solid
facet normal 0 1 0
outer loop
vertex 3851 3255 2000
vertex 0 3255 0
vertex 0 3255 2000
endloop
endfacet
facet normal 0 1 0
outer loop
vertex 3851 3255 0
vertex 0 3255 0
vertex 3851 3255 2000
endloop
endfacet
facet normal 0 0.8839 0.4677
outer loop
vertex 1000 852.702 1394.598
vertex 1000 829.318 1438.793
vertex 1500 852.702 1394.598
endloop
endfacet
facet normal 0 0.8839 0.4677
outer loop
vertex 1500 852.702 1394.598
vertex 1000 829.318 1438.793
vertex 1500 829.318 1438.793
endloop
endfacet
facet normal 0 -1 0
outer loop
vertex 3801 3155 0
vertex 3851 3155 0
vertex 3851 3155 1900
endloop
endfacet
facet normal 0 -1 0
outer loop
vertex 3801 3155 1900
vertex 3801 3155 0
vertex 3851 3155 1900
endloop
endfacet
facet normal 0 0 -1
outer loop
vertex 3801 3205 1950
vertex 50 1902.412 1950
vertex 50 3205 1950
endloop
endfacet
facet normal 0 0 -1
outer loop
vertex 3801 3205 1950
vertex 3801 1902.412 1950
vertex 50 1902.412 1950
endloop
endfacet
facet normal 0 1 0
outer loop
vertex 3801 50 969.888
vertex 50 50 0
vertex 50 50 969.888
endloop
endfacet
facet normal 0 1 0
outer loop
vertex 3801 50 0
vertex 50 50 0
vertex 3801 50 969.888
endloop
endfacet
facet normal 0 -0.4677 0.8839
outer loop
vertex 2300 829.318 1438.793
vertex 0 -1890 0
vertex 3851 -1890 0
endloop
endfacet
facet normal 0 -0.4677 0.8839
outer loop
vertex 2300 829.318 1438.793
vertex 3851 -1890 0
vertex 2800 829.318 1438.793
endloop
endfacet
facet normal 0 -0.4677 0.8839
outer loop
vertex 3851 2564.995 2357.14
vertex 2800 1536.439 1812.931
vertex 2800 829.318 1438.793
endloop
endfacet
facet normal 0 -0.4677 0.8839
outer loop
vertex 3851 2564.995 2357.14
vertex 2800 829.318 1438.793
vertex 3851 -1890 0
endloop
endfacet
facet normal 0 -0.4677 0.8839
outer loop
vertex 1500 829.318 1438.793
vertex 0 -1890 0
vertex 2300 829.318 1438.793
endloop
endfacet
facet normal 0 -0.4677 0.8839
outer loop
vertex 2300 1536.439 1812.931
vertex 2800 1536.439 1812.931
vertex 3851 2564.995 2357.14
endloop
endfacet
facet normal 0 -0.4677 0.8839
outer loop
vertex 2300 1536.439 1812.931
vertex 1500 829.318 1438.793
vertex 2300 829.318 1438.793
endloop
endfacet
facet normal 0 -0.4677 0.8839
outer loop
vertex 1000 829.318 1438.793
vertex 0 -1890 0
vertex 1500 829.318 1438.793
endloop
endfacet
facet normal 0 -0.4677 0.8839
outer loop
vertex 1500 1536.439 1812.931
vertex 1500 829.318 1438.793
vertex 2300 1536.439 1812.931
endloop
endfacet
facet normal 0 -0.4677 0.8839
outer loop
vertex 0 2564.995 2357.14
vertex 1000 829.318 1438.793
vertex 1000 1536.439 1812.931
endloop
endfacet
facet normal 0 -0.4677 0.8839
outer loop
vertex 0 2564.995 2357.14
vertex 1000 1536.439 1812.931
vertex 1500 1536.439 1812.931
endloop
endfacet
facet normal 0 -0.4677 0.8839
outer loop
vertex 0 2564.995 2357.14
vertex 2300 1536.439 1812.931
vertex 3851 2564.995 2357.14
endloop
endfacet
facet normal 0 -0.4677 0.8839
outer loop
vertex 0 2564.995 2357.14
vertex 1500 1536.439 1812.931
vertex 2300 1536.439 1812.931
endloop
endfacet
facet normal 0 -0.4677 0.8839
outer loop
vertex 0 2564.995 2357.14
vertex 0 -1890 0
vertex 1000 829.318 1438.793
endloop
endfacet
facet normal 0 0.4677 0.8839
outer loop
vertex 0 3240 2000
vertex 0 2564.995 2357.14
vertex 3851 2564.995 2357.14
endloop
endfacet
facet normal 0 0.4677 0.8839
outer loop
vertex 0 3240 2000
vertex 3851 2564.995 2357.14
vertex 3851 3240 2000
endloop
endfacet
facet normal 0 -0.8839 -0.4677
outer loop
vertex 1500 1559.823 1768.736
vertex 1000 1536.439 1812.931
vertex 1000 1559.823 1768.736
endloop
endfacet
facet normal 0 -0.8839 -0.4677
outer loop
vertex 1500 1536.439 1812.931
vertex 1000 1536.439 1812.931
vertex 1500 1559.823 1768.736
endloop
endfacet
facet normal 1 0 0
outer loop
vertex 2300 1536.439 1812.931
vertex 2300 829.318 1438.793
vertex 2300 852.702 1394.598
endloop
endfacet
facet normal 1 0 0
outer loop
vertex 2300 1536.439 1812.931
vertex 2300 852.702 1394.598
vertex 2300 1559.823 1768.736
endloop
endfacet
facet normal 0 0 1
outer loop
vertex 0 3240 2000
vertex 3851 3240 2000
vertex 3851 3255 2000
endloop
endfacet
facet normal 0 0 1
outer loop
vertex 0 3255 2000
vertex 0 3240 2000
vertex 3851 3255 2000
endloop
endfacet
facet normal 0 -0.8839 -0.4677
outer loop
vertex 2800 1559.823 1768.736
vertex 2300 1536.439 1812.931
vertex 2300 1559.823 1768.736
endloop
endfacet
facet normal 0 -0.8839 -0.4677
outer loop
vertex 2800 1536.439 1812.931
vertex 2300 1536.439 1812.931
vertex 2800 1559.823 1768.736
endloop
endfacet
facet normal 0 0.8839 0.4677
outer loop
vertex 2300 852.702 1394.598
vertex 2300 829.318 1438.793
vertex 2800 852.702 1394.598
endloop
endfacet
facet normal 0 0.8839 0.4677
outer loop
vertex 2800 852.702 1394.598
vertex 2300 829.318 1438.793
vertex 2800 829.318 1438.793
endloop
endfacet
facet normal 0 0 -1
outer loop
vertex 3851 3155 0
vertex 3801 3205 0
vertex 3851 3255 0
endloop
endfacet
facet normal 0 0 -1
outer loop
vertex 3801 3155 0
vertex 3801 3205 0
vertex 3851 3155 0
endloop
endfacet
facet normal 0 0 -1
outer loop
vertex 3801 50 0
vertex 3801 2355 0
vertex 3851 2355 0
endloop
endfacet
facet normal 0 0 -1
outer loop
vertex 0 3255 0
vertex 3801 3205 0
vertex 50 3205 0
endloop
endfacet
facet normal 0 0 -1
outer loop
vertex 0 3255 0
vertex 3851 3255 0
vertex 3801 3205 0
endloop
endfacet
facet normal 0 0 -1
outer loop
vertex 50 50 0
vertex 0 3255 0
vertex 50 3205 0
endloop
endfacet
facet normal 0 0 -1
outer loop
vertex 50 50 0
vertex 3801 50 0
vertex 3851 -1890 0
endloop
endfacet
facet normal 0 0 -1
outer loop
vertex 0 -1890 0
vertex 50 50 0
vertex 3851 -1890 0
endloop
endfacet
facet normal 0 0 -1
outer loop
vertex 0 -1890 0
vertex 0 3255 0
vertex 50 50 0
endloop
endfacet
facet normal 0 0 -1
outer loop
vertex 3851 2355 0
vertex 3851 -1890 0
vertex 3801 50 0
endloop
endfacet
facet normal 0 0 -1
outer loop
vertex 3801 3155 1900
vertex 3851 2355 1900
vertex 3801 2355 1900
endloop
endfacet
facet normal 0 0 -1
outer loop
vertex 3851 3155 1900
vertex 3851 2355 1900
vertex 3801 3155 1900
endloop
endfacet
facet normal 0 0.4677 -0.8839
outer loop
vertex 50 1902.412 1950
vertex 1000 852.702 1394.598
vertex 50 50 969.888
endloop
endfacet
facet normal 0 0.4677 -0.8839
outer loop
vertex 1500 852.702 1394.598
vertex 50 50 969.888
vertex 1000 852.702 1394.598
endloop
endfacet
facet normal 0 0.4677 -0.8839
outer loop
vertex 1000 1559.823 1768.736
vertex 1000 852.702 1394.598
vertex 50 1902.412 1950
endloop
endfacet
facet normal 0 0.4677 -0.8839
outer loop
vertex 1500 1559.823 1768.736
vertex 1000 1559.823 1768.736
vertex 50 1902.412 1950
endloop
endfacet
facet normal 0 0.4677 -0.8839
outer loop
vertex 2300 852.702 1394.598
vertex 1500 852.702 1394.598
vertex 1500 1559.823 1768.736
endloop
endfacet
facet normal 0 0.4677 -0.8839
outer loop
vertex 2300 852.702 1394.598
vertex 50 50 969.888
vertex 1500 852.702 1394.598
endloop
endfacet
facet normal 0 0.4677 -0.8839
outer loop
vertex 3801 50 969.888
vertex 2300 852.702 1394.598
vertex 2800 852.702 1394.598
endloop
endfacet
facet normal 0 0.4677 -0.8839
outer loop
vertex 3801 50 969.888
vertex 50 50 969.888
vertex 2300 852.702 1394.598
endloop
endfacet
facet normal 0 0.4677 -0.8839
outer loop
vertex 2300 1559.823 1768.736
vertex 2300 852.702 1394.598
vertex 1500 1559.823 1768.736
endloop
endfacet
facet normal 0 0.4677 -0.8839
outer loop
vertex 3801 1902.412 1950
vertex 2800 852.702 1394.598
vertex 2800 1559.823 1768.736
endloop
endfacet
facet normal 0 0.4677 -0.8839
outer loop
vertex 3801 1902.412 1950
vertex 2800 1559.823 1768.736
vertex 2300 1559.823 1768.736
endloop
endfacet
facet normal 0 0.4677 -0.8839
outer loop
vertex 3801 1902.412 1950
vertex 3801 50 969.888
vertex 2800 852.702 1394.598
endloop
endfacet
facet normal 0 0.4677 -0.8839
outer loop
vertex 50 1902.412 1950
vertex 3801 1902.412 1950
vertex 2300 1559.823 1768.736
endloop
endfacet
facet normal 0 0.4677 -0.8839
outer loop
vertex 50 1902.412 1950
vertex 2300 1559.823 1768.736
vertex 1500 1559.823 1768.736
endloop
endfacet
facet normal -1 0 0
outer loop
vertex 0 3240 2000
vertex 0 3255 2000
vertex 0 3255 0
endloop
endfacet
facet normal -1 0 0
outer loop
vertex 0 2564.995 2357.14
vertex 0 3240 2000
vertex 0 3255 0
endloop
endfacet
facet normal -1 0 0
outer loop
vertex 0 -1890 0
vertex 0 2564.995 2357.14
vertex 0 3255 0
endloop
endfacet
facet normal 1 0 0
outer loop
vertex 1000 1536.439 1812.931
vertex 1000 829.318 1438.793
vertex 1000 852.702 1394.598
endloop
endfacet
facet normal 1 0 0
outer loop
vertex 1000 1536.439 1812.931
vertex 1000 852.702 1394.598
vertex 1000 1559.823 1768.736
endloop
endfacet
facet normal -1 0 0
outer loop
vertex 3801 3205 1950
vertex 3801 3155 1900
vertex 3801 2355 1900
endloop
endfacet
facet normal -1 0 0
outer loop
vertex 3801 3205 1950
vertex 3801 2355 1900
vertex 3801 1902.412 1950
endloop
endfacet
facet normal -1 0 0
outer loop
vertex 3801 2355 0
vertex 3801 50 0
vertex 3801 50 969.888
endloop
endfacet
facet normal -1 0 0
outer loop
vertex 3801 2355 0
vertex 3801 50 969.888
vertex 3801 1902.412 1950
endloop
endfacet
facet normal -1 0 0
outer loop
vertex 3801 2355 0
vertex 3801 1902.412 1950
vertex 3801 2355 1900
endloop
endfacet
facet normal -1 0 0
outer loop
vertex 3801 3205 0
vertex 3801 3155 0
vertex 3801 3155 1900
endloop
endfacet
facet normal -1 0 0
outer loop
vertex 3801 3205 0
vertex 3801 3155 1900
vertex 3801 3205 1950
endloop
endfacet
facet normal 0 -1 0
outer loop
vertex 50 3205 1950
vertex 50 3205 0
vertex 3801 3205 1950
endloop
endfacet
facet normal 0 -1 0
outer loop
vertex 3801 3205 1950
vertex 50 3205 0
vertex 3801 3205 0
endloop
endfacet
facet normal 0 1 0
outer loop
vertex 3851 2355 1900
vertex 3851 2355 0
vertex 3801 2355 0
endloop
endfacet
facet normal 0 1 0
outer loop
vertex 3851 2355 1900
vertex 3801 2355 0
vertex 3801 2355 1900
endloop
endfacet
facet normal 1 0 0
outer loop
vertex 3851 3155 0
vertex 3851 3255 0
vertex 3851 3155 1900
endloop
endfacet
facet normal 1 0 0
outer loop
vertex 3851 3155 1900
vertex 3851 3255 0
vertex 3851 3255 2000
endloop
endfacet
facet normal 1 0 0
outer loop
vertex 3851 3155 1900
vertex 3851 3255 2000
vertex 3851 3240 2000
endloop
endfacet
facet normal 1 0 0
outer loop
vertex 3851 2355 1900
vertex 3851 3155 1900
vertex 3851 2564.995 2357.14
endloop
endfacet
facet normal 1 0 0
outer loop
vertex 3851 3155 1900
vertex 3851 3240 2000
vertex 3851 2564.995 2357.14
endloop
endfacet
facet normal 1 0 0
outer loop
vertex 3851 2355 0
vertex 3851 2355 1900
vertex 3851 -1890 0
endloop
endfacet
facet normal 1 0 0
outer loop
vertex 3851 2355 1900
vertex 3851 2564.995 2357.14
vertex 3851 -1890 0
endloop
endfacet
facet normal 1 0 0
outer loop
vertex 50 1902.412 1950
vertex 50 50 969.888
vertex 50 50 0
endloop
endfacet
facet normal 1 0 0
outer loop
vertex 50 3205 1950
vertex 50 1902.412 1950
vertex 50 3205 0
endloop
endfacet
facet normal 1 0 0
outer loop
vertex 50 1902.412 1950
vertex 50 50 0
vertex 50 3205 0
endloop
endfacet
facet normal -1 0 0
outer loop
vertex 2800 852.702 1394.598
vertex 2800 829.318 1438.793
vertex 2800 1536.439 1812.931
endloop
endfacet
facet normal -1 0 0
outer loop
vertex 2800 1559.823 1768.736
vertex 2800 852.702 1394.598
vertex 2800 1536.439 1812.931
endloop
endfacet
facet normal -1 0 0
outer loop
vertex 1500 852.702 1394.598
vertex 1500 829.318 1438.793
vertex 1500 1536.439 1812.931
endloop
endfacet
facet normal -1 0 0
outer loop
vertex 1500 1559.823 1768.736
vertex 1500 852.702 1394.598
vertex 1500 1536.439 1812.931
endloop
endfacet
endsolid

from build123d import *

# Parameters (mm, degrees)
F0_W      = 3851
F0_H      = 3255
F1_DEPTH  = 2500
F3_DEPTH  = 3851
F4_T      = -50
F5_W      = 800
F5_H      = 1900
F6_DEPTH  = 50
F7_W      = 500
F7_H      = 800
F8_DEPTH  = 50
F10_DEPTH = 3851


with BuildPart() as f1:
    # F0 (on Top) → F1 (new body)
    with BuildSketch(Plane.XY):
        with Locations((1925.5, 1627.5)):
            Rectangle(F0_W, F0_H)
    extrude(amount=F1_DEPTH)

    # F2 (on face) → F3 (cut, through all)
    with BuildSketch(Plane.YZ.offset(3851)):
        Polygon((0, 2500), (0, 1000), (1890, 2000), (3255, 2000), (3255, 2500), align=None)
    extrude(amount=-F3_DEPTH, mode=Mode.SUBTRACT)

    # F4
    f4_openings = [f1.faces().sort_by_distance(p)[0] for p in [
        (1925.5, 1627.5, 0),
    ]]
    offset(amount=F4_T, openings=f4_openings)

    # F5 (on face) → F6 (cut, through all)
    with BuildSketch(Plane.YZ.offset(3851)):
        with Locations((2755, 950)):
            Rectangle(F5_W, F5_H)
    extrude(amount=-F6_DEPTH, mode=Mode.SUBTRACT)

    # F7 (on face) → F8 (cut, through all)
    with BuildSketch(Plane(origin=(0, -413.3767852847, 781.282124188), x_dir=(1, 0, 0), z_dir=(0, -0.4676728299, 0.8839016485))):
        with Locations((1250, 1805.9197753983)):
            Rectangle(F7_W, F7_H)
        with Locations((2550, 1805.9197753983)):
            Rectangle(F7_W, F7_H)
    extrude(amount=-F8_DEPTH, mode=Mode.SUBTRACT)

    # F9 (on face) → F10 (join, through all)
    with BuildSketch(Plane(origin=(0, 0, 0), x_dir=(0, -1, 0), z_dir=(-1, 0, 0))):
        Polygon((-1890, 2000), (-2564.9951462485, 2357.1402890204), (-3240, 2000), align=None)
        Polygon((0, 1000), (0, 0), (1890, 0), align=None)
    extrude(amount=-F10_DEPTH)


solid = f1.part
